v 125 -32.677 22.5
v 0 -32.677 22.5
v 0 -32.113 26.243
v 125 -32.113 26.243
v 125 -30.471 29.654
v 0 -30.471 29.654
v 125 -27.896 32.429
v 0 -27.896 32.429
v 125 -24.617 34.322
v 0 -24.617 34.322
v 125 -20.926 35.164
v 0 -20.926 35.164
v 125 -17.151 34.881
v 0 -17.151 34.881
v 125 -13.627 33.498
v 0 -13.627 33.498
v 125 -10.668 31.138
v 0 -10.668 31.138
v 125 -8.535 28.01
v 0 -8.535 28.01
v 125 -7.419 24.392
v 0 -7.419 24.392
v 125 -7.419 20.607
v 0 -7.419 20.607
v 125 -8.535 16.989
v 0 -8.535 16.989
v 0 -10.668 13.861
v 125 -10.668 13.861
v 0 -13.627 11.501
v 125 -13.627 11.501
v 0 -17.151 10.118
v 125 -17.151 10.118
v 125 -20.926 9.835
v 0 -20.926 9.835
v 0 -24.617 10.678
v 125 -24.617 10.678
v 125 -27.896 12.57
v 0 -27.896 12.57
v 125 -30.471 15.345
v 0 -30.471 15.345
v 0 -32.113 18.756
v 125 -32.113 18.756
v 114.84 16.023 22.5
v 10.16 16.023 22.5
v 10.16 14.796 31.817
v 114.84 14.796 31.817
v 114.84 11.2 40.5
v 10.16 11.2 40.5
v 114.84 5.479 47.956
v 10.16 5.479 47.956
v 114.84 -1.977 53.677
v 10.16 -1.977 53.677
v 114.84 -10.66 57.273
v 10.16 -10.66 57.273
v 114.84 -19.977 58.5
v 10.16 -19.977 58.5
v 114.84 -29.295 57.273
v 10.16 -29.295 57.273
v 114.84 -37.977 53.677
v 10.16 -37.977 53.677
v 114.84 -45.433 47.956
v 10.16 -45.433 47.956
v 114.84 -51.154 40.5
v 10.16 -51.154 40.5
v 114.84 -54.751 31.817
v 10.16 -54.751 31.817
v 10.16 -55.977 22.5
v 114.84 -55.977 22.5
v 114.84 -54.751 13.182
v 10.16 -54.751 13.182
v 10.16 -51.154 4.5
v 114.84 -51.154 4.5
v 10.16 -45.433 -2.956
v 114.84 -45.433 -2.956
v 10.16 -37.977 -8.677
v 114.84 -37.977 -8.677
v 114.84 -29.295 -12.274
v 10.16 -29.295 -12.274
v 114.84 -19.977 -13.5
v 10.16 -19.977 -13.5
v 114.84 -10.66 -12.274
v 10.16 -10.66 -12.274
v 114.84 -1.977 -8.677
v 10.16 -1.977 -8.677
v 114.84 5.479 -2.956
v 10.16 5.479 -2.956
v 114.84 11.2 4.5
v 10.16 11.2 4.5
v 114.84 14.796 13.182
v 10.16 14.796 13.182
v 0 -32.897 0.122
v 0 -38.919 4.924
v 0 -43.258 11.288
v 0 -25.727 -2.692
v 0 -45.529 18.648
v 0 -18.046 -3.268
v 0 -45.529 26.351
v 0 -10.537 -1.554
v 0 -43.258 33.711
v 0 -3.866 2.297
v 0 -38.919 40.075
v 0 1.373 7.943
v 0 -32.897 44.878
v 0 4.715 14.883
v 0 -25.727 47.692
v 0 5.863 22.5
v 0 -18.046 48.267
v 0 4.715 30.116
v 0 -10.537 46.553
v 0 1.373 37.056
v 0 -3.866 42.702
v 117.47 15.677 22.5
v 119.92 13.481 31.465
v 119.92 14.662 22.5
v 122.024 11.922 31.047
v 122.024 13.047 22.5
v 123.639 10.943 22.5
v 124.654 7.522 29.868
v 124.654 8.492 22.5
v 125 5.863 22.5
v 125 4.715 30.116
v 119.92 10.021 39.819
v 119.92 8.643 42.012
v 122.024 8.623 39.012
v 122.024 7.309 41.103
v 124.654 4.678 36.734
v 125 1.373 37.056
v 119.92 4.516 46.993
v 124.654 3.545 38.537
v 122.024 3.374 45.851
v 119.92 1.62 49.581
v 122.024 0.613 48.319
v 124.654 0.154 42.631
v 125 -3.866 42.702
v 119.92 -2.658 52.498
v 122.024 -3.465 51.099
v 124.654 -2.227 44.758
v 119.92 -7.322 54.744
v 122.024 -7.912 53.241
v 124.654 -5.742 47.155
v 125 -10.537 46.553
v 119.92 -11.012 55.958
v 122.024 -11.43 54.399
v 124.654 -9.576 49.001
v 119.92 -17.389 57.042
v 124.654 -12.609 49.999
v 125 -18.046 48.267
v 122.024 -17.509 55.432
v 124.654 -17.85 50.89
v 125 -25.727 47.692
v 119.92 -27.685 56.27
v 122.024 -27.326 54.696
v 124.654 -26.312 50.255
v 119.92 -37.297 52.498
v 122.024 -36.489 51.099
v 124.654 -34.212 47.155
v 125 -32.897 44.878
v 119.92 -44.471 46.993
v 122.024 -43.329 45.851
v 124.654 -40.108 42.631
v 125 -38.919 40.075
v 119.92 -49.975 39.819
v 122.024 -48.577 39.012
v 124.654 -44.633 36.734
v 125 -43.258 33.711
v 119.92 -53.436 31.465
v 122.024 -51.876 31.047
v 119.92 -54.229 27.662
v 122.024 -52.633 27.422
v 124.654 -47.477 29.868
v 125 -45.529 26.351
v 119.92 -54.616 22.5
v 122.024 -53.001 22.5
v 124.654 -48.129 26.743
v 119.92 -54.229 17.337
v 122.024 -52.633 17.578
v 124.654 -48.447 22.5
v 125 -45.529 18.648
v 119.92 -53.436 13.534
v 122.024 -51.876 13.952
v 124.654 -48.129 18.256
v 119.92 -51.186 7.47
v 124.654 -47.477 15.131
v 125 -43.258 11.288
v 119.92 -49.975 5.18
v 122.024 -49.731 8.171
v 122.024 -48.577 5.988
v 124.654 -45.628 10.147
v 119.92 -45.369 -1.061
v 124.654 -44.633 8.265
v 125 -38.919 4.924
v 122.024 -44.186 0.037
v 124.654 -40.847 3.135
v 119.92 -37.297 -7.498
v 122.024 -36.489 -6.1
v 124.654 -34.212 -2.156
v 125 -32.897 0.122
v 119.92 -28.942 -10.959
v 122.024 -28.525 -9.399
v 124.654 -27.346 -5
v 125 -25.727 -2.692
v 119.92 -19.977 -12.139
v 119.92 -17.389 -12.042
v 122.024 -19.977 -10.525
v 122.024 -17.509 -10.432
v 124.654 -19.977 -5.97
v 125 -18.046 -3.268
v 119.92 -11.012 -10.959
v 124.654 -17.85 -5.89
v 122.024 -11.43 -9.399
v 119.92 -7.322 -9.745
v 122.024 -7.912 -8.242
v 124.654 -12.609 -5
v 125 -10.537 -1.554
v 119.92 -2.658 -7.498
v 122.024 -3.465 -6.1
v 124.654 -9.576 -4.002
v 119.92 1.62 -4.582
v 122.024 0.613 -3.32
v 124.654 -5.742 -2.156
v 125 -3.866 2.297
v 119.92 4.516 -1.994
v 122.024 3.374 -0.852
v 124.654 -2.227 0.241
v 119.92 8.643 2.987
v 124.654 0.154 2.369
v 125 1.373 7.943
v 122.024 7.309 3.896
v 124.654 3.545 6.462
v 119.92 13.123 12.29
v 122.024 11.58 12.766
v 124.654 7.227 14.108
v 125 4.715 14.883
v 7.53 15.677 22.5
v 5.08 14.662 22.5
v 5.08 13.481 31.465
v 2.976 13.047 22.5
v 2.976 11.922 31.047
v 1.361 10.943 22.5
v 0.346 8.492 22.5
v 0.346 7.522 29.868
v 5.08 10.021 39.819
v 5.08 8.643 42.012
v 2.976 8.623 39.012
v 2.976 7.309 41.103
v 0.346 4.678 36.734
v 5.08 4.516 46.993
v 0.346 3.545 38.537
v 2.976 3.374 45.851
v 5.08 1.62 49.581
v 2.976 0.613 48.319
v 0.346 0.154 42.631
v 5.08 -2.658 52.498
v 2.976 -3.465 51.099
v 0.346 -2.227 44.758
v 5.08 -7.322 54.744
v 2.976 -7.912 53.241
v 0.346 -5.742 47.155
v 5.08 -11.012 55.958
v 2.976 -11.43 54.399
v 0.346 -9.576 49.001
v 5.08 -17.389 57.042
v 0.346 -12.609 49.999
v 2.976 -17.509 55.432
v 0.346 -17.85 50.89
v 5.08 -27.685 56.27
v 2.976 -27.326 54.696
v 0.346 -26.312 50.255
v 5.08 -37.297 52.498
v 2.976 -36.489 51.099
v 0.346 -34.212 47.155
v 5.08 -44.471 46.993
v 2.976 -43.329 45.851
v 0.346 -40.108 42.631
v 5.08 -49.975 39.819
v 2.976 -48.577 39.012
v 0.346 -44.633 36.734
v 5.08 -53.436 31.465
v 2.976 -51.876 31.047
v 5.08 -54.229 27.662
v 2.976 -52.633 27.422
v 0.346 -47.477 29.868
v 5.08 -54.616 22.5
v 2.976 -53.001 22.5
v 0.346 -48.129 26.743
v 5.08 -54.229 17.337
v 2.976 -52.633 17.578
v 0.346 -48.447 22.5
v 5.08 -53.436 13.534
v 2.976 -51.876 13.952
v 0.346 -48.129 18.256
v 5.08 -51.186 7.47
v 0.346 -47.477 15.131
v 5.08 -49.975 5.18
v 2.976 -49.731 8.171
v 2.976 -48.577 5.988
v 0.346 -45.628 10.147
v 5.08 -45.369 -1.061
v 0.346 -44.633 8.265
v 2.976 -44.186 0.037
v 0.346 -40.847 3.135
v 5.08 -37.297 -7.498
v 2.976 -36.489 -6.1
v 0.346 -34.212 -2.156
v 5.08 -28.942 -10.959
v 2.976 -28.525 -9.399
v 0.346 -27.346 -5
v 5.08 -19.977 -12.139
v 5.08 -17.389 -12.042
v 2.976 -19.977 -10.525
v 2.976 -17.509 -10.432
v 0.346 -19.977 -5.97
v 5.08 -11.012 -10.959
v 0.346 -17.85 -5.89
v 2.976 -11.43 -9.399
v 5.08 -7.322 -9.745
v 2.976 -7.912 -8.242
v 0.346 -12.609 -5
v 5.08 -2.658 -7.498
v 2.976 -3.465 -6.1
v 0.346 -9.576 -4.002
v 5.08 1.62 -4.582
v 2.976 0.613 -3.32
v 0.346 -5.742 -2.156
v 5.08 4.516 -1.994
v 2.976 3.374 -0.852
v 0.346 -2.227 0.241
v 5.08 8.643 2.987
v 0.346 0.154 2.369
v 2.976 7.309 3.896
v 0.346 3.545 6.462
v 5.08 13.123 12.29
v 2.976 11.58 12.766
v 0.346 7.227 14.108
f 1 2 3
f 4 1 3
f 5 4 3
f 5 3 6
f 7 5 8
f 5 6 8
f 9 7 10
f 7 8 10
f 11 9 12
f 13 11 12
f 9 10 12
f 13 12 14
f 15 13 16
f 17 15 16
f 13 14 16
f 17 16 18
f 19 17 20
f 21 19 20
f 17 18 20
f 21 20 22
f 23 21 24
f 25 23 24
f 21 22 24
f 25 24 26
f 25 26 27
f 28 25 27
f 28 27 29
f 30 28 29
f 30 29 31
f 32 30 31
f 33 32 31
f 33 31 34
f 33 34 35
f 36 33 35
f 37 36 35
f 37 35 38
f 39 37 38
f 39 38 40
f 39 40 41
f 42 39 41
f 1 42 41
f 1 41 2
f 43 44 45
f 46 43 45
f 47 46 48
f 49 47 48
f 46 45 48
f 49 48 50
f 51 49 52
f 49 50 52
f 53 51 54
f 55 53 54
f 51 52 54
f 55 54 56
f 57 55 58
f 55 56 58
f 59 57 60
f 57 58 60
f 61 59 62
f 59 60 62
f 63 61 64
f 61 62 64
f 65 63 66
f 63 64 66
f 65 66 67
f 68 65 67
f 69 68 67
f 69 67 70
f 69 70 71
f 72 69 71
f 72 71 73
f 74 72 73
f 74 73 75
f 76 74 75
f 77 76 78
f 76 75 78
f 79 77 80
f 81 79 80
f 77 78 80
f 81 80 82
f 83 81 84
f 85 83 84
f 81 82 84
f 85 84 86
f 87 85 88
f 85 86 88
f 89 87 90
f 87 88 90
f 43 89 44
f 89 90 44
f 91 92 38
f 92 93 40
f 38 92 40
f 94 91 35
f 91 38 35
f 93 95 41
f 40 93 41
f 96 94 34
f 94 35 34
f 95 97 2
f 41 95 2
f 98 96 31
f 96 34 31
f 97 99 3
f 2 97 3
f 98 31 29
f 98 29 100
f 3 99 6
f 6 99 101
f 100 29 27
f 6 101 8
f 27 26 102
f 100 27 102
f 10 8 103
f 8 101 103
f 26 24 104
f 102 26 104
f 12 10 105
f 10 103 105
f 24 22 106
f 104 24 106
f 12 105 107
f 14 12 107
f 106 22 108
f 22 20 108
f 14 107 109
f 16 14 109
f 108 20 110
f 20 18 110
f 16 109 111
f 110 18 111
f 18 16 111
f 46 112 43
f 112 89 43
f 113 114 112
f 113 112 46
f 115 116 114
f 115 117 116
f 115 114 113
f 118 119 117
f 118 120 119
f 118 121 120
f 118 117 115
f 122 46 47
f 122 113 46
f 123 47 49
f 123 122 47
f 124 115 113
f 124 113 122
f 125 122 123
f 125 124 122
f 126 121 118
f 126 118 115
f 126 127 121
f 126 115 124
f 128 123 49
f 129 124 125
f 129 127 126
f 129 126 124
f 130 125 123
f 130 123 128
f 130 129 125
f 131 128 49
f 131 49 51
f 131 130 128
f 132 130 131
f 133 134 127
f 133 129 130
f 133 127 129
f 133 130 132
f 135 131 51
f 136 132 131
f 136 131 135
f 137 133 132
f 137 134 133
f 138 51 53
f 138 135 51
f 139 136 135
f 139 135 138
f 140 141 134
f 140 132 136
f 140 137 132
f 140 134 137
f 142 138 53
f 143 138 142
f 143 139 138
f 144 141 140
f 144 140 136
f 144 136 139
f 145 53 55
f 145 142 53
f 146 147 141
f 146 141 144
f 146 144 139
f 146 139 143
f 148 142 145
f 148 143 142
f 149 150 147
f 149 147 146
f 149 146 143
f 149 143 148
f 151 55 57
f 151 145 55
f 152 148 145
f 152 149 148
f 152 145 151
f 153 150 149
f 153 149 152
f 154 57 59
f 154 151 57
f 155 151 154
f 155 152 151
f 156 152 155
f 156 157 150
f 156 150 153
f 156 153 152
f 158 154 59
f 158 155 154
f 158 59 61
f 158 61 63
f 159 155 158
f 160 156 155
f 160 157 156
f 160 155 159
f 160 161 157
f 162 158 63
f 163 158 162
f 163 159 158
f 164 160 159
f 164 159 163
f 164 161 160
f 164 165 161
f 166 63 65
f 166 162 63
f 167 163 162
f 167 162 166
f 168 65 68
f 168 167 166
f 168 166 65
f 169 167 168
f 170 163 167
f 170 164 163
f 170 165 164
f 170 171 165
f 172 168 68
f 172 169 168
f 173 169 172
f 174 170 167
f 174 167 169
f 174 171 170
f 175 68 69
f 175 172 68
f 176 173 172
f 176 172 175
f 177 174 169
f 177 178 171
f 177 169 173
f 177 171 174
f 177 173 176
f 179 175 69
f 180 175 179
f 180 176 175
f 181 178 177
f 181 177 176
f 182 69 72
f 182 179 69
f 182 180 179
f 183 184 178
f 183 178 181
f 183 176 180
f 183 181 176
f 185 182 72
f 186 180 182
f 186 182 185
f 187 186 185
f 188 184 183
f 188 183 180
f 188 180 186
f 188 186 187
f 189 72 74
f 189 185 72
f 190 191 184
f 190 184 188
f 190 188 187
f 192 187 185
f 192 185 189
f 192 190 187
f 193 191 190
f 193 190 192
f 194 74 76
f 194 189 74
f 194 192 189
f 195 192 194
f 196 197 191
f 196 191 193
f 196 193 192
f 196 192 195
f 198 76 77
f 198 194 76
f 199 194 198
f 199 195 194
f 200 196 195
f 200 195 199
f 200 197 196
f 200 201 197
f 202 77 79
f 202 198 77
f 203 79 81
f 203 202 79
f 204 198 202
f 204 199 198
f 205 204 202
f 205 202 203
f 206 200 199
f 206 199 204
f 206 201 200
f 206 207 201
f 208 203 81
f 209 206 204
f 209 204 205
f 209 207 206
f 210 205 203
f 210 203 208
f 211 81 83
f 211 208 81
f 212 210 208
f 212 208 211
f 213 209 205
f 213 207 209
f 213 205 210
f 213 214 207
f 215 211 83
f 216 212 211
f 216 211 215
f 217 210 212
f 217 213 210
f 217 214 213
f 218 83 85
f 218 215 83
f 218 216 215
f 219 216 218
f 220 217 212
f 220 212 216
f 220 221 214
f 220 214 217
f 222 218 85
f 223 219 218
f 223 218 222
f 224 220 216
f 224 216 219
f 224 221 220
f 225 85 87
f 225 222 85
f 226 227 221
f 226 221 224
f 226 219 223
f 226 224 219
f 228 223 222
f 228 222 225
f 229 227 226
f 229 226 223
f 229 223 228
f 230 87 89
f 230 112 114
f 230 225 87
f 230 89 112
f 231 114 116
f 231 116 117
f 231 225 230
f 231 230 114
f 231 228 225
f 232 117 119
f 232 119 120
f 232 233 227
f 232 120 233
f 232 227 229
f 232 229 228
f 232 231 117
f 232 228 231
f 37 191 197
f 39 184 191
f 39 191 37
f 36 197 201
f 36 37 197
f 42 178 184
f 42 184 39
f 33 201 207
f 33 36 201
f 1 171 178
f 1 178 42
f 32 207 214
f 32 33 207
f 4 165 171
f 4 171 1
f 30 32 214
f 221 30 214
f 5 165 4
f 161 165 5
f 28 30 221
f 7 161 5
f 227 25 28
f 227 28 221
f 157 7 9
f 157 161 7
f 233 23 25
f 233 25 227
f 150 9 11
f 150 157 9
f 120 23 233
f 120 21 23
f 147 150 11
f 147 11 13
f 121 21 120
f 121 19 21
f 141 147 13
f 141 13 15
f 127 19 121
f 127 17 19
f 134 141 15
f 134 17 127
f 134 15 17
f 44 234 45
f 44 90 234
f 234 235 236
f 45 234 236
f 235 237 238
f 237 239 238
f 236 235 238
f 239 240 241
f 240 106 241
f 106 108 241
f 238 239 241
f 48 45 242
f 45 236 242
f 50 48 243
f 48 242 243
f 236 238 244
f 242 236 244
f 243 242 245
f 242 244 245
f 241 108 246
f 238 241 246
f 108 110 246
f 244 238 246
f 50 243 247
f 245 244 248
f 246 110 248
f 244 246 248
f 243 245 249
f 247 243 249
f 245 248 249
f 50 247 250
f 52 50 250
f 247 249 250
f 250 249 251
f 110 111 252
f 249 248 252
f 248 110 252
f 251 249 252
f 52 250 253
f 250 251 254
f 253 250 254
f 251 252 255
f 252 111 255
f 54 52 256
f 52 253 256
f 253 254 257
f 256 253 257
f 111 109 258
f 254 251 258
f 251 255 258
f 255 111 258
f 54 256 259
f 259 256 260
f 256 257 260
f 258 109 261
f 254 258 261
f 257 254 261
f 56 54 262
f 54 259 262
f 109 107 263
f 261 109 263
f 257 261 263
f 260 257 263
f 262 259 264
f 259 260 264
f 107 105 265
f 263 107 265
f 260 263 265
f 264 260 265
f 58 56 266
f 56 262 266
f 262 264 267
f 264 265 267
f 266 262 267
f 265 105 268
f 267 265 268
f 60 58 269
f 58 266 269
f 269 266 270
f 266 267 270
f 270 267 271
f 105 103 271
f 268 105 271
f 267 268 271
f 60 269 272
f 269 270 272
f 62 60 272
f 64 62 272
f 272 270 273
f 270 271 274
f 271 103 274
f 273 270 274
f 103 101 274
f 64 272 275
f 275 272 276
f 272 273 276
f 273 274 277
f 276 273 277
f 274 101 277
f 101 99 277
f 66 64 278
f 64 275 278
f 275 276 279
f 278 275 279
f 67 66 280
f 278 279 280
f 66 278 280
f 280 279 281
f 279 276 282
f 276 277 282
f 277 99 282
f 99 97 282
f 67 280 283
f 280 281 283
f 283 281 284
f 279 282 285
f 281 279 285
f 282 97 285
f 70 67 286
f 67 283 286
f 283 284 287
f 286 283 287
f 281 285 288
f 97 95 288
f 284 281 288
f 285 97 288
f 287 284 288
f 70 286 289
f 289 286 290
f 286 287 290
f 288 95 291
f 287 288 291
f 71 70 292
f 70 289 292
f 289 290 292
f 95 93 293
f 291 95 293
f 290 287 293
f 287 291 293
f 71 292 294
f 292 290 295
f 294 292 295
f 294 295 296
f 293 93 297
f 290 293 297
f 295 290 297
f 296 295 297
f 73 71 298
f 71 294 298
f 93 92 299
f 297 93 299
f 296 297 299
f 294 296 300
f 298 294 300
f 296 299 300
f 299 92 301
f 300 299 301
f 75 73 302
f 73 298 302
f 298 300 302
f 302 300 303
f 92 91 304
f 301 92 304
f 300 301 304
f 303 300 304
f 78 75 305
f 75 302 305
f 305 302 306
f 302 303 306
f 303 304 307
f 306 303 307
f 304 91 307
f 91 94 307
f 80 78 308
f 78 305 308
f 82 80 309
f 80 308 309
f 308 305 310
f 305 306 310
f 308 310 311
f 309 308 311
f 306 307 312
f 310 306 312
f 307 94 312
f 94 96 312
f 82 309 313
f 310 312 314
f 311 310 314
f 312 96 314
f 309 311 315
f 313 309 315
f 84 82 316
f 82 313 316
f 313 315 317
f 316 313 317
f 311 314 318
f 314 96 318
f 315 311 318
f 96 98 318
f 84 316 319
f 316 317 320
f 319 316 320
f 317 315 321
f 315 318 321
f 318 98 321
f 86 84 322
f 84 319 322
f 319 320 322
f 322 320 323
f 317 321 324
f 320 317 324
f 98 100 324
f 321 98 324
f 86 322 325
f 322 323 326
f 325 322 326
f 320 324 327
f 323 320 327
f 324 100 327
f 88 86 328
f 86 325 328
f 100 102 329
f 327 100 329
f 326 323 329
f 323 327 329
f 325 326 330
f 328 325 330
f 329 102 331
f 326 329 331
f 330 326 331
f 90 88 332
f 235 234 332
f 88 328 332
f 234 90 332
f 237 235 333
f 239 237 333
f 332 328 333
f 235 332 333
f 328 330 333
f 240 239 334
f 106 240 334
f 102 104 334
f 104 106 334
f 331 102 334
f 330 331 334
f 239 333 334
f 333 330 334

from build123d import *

# Parameters (mm, degrees)
F0_R     = 36
F1_DEPTH = 125
F2_R     = 12.7
F3_DEPTH = 254
F4_R     = 10.16


with BuildPart() as f1:
    # F0 (on Right) → F1 (new body)
    with BuildSketch(Plane.YZ):
        with Locations((-19.977277, 22.49966)):
            Circle(F0_R)
    extrude(amount=F1_DEPTH)

    # F2 (on face) → F3 (cut)
    with BuildSketch(Plane(origin=(0, 0, 0), x_dir=(0, -1, 0), z_dir=(-1, 0, 0))):
        with Locations((19.977277, 22.49966)):
            Circle(F2_R)
    extrude(amount=-F3_DEPTH, mode=Mode.SUBTRACT)

    # F4
    f4_edges = [f1.edges().sort_by_distance(p)[0] for p in [
        (0, -55.977277, 22.49966),
        (125, -55.977277, 22.49966),
    ]]
    fillet(f4_edges, radius=F4_R)


solid = f1.part
